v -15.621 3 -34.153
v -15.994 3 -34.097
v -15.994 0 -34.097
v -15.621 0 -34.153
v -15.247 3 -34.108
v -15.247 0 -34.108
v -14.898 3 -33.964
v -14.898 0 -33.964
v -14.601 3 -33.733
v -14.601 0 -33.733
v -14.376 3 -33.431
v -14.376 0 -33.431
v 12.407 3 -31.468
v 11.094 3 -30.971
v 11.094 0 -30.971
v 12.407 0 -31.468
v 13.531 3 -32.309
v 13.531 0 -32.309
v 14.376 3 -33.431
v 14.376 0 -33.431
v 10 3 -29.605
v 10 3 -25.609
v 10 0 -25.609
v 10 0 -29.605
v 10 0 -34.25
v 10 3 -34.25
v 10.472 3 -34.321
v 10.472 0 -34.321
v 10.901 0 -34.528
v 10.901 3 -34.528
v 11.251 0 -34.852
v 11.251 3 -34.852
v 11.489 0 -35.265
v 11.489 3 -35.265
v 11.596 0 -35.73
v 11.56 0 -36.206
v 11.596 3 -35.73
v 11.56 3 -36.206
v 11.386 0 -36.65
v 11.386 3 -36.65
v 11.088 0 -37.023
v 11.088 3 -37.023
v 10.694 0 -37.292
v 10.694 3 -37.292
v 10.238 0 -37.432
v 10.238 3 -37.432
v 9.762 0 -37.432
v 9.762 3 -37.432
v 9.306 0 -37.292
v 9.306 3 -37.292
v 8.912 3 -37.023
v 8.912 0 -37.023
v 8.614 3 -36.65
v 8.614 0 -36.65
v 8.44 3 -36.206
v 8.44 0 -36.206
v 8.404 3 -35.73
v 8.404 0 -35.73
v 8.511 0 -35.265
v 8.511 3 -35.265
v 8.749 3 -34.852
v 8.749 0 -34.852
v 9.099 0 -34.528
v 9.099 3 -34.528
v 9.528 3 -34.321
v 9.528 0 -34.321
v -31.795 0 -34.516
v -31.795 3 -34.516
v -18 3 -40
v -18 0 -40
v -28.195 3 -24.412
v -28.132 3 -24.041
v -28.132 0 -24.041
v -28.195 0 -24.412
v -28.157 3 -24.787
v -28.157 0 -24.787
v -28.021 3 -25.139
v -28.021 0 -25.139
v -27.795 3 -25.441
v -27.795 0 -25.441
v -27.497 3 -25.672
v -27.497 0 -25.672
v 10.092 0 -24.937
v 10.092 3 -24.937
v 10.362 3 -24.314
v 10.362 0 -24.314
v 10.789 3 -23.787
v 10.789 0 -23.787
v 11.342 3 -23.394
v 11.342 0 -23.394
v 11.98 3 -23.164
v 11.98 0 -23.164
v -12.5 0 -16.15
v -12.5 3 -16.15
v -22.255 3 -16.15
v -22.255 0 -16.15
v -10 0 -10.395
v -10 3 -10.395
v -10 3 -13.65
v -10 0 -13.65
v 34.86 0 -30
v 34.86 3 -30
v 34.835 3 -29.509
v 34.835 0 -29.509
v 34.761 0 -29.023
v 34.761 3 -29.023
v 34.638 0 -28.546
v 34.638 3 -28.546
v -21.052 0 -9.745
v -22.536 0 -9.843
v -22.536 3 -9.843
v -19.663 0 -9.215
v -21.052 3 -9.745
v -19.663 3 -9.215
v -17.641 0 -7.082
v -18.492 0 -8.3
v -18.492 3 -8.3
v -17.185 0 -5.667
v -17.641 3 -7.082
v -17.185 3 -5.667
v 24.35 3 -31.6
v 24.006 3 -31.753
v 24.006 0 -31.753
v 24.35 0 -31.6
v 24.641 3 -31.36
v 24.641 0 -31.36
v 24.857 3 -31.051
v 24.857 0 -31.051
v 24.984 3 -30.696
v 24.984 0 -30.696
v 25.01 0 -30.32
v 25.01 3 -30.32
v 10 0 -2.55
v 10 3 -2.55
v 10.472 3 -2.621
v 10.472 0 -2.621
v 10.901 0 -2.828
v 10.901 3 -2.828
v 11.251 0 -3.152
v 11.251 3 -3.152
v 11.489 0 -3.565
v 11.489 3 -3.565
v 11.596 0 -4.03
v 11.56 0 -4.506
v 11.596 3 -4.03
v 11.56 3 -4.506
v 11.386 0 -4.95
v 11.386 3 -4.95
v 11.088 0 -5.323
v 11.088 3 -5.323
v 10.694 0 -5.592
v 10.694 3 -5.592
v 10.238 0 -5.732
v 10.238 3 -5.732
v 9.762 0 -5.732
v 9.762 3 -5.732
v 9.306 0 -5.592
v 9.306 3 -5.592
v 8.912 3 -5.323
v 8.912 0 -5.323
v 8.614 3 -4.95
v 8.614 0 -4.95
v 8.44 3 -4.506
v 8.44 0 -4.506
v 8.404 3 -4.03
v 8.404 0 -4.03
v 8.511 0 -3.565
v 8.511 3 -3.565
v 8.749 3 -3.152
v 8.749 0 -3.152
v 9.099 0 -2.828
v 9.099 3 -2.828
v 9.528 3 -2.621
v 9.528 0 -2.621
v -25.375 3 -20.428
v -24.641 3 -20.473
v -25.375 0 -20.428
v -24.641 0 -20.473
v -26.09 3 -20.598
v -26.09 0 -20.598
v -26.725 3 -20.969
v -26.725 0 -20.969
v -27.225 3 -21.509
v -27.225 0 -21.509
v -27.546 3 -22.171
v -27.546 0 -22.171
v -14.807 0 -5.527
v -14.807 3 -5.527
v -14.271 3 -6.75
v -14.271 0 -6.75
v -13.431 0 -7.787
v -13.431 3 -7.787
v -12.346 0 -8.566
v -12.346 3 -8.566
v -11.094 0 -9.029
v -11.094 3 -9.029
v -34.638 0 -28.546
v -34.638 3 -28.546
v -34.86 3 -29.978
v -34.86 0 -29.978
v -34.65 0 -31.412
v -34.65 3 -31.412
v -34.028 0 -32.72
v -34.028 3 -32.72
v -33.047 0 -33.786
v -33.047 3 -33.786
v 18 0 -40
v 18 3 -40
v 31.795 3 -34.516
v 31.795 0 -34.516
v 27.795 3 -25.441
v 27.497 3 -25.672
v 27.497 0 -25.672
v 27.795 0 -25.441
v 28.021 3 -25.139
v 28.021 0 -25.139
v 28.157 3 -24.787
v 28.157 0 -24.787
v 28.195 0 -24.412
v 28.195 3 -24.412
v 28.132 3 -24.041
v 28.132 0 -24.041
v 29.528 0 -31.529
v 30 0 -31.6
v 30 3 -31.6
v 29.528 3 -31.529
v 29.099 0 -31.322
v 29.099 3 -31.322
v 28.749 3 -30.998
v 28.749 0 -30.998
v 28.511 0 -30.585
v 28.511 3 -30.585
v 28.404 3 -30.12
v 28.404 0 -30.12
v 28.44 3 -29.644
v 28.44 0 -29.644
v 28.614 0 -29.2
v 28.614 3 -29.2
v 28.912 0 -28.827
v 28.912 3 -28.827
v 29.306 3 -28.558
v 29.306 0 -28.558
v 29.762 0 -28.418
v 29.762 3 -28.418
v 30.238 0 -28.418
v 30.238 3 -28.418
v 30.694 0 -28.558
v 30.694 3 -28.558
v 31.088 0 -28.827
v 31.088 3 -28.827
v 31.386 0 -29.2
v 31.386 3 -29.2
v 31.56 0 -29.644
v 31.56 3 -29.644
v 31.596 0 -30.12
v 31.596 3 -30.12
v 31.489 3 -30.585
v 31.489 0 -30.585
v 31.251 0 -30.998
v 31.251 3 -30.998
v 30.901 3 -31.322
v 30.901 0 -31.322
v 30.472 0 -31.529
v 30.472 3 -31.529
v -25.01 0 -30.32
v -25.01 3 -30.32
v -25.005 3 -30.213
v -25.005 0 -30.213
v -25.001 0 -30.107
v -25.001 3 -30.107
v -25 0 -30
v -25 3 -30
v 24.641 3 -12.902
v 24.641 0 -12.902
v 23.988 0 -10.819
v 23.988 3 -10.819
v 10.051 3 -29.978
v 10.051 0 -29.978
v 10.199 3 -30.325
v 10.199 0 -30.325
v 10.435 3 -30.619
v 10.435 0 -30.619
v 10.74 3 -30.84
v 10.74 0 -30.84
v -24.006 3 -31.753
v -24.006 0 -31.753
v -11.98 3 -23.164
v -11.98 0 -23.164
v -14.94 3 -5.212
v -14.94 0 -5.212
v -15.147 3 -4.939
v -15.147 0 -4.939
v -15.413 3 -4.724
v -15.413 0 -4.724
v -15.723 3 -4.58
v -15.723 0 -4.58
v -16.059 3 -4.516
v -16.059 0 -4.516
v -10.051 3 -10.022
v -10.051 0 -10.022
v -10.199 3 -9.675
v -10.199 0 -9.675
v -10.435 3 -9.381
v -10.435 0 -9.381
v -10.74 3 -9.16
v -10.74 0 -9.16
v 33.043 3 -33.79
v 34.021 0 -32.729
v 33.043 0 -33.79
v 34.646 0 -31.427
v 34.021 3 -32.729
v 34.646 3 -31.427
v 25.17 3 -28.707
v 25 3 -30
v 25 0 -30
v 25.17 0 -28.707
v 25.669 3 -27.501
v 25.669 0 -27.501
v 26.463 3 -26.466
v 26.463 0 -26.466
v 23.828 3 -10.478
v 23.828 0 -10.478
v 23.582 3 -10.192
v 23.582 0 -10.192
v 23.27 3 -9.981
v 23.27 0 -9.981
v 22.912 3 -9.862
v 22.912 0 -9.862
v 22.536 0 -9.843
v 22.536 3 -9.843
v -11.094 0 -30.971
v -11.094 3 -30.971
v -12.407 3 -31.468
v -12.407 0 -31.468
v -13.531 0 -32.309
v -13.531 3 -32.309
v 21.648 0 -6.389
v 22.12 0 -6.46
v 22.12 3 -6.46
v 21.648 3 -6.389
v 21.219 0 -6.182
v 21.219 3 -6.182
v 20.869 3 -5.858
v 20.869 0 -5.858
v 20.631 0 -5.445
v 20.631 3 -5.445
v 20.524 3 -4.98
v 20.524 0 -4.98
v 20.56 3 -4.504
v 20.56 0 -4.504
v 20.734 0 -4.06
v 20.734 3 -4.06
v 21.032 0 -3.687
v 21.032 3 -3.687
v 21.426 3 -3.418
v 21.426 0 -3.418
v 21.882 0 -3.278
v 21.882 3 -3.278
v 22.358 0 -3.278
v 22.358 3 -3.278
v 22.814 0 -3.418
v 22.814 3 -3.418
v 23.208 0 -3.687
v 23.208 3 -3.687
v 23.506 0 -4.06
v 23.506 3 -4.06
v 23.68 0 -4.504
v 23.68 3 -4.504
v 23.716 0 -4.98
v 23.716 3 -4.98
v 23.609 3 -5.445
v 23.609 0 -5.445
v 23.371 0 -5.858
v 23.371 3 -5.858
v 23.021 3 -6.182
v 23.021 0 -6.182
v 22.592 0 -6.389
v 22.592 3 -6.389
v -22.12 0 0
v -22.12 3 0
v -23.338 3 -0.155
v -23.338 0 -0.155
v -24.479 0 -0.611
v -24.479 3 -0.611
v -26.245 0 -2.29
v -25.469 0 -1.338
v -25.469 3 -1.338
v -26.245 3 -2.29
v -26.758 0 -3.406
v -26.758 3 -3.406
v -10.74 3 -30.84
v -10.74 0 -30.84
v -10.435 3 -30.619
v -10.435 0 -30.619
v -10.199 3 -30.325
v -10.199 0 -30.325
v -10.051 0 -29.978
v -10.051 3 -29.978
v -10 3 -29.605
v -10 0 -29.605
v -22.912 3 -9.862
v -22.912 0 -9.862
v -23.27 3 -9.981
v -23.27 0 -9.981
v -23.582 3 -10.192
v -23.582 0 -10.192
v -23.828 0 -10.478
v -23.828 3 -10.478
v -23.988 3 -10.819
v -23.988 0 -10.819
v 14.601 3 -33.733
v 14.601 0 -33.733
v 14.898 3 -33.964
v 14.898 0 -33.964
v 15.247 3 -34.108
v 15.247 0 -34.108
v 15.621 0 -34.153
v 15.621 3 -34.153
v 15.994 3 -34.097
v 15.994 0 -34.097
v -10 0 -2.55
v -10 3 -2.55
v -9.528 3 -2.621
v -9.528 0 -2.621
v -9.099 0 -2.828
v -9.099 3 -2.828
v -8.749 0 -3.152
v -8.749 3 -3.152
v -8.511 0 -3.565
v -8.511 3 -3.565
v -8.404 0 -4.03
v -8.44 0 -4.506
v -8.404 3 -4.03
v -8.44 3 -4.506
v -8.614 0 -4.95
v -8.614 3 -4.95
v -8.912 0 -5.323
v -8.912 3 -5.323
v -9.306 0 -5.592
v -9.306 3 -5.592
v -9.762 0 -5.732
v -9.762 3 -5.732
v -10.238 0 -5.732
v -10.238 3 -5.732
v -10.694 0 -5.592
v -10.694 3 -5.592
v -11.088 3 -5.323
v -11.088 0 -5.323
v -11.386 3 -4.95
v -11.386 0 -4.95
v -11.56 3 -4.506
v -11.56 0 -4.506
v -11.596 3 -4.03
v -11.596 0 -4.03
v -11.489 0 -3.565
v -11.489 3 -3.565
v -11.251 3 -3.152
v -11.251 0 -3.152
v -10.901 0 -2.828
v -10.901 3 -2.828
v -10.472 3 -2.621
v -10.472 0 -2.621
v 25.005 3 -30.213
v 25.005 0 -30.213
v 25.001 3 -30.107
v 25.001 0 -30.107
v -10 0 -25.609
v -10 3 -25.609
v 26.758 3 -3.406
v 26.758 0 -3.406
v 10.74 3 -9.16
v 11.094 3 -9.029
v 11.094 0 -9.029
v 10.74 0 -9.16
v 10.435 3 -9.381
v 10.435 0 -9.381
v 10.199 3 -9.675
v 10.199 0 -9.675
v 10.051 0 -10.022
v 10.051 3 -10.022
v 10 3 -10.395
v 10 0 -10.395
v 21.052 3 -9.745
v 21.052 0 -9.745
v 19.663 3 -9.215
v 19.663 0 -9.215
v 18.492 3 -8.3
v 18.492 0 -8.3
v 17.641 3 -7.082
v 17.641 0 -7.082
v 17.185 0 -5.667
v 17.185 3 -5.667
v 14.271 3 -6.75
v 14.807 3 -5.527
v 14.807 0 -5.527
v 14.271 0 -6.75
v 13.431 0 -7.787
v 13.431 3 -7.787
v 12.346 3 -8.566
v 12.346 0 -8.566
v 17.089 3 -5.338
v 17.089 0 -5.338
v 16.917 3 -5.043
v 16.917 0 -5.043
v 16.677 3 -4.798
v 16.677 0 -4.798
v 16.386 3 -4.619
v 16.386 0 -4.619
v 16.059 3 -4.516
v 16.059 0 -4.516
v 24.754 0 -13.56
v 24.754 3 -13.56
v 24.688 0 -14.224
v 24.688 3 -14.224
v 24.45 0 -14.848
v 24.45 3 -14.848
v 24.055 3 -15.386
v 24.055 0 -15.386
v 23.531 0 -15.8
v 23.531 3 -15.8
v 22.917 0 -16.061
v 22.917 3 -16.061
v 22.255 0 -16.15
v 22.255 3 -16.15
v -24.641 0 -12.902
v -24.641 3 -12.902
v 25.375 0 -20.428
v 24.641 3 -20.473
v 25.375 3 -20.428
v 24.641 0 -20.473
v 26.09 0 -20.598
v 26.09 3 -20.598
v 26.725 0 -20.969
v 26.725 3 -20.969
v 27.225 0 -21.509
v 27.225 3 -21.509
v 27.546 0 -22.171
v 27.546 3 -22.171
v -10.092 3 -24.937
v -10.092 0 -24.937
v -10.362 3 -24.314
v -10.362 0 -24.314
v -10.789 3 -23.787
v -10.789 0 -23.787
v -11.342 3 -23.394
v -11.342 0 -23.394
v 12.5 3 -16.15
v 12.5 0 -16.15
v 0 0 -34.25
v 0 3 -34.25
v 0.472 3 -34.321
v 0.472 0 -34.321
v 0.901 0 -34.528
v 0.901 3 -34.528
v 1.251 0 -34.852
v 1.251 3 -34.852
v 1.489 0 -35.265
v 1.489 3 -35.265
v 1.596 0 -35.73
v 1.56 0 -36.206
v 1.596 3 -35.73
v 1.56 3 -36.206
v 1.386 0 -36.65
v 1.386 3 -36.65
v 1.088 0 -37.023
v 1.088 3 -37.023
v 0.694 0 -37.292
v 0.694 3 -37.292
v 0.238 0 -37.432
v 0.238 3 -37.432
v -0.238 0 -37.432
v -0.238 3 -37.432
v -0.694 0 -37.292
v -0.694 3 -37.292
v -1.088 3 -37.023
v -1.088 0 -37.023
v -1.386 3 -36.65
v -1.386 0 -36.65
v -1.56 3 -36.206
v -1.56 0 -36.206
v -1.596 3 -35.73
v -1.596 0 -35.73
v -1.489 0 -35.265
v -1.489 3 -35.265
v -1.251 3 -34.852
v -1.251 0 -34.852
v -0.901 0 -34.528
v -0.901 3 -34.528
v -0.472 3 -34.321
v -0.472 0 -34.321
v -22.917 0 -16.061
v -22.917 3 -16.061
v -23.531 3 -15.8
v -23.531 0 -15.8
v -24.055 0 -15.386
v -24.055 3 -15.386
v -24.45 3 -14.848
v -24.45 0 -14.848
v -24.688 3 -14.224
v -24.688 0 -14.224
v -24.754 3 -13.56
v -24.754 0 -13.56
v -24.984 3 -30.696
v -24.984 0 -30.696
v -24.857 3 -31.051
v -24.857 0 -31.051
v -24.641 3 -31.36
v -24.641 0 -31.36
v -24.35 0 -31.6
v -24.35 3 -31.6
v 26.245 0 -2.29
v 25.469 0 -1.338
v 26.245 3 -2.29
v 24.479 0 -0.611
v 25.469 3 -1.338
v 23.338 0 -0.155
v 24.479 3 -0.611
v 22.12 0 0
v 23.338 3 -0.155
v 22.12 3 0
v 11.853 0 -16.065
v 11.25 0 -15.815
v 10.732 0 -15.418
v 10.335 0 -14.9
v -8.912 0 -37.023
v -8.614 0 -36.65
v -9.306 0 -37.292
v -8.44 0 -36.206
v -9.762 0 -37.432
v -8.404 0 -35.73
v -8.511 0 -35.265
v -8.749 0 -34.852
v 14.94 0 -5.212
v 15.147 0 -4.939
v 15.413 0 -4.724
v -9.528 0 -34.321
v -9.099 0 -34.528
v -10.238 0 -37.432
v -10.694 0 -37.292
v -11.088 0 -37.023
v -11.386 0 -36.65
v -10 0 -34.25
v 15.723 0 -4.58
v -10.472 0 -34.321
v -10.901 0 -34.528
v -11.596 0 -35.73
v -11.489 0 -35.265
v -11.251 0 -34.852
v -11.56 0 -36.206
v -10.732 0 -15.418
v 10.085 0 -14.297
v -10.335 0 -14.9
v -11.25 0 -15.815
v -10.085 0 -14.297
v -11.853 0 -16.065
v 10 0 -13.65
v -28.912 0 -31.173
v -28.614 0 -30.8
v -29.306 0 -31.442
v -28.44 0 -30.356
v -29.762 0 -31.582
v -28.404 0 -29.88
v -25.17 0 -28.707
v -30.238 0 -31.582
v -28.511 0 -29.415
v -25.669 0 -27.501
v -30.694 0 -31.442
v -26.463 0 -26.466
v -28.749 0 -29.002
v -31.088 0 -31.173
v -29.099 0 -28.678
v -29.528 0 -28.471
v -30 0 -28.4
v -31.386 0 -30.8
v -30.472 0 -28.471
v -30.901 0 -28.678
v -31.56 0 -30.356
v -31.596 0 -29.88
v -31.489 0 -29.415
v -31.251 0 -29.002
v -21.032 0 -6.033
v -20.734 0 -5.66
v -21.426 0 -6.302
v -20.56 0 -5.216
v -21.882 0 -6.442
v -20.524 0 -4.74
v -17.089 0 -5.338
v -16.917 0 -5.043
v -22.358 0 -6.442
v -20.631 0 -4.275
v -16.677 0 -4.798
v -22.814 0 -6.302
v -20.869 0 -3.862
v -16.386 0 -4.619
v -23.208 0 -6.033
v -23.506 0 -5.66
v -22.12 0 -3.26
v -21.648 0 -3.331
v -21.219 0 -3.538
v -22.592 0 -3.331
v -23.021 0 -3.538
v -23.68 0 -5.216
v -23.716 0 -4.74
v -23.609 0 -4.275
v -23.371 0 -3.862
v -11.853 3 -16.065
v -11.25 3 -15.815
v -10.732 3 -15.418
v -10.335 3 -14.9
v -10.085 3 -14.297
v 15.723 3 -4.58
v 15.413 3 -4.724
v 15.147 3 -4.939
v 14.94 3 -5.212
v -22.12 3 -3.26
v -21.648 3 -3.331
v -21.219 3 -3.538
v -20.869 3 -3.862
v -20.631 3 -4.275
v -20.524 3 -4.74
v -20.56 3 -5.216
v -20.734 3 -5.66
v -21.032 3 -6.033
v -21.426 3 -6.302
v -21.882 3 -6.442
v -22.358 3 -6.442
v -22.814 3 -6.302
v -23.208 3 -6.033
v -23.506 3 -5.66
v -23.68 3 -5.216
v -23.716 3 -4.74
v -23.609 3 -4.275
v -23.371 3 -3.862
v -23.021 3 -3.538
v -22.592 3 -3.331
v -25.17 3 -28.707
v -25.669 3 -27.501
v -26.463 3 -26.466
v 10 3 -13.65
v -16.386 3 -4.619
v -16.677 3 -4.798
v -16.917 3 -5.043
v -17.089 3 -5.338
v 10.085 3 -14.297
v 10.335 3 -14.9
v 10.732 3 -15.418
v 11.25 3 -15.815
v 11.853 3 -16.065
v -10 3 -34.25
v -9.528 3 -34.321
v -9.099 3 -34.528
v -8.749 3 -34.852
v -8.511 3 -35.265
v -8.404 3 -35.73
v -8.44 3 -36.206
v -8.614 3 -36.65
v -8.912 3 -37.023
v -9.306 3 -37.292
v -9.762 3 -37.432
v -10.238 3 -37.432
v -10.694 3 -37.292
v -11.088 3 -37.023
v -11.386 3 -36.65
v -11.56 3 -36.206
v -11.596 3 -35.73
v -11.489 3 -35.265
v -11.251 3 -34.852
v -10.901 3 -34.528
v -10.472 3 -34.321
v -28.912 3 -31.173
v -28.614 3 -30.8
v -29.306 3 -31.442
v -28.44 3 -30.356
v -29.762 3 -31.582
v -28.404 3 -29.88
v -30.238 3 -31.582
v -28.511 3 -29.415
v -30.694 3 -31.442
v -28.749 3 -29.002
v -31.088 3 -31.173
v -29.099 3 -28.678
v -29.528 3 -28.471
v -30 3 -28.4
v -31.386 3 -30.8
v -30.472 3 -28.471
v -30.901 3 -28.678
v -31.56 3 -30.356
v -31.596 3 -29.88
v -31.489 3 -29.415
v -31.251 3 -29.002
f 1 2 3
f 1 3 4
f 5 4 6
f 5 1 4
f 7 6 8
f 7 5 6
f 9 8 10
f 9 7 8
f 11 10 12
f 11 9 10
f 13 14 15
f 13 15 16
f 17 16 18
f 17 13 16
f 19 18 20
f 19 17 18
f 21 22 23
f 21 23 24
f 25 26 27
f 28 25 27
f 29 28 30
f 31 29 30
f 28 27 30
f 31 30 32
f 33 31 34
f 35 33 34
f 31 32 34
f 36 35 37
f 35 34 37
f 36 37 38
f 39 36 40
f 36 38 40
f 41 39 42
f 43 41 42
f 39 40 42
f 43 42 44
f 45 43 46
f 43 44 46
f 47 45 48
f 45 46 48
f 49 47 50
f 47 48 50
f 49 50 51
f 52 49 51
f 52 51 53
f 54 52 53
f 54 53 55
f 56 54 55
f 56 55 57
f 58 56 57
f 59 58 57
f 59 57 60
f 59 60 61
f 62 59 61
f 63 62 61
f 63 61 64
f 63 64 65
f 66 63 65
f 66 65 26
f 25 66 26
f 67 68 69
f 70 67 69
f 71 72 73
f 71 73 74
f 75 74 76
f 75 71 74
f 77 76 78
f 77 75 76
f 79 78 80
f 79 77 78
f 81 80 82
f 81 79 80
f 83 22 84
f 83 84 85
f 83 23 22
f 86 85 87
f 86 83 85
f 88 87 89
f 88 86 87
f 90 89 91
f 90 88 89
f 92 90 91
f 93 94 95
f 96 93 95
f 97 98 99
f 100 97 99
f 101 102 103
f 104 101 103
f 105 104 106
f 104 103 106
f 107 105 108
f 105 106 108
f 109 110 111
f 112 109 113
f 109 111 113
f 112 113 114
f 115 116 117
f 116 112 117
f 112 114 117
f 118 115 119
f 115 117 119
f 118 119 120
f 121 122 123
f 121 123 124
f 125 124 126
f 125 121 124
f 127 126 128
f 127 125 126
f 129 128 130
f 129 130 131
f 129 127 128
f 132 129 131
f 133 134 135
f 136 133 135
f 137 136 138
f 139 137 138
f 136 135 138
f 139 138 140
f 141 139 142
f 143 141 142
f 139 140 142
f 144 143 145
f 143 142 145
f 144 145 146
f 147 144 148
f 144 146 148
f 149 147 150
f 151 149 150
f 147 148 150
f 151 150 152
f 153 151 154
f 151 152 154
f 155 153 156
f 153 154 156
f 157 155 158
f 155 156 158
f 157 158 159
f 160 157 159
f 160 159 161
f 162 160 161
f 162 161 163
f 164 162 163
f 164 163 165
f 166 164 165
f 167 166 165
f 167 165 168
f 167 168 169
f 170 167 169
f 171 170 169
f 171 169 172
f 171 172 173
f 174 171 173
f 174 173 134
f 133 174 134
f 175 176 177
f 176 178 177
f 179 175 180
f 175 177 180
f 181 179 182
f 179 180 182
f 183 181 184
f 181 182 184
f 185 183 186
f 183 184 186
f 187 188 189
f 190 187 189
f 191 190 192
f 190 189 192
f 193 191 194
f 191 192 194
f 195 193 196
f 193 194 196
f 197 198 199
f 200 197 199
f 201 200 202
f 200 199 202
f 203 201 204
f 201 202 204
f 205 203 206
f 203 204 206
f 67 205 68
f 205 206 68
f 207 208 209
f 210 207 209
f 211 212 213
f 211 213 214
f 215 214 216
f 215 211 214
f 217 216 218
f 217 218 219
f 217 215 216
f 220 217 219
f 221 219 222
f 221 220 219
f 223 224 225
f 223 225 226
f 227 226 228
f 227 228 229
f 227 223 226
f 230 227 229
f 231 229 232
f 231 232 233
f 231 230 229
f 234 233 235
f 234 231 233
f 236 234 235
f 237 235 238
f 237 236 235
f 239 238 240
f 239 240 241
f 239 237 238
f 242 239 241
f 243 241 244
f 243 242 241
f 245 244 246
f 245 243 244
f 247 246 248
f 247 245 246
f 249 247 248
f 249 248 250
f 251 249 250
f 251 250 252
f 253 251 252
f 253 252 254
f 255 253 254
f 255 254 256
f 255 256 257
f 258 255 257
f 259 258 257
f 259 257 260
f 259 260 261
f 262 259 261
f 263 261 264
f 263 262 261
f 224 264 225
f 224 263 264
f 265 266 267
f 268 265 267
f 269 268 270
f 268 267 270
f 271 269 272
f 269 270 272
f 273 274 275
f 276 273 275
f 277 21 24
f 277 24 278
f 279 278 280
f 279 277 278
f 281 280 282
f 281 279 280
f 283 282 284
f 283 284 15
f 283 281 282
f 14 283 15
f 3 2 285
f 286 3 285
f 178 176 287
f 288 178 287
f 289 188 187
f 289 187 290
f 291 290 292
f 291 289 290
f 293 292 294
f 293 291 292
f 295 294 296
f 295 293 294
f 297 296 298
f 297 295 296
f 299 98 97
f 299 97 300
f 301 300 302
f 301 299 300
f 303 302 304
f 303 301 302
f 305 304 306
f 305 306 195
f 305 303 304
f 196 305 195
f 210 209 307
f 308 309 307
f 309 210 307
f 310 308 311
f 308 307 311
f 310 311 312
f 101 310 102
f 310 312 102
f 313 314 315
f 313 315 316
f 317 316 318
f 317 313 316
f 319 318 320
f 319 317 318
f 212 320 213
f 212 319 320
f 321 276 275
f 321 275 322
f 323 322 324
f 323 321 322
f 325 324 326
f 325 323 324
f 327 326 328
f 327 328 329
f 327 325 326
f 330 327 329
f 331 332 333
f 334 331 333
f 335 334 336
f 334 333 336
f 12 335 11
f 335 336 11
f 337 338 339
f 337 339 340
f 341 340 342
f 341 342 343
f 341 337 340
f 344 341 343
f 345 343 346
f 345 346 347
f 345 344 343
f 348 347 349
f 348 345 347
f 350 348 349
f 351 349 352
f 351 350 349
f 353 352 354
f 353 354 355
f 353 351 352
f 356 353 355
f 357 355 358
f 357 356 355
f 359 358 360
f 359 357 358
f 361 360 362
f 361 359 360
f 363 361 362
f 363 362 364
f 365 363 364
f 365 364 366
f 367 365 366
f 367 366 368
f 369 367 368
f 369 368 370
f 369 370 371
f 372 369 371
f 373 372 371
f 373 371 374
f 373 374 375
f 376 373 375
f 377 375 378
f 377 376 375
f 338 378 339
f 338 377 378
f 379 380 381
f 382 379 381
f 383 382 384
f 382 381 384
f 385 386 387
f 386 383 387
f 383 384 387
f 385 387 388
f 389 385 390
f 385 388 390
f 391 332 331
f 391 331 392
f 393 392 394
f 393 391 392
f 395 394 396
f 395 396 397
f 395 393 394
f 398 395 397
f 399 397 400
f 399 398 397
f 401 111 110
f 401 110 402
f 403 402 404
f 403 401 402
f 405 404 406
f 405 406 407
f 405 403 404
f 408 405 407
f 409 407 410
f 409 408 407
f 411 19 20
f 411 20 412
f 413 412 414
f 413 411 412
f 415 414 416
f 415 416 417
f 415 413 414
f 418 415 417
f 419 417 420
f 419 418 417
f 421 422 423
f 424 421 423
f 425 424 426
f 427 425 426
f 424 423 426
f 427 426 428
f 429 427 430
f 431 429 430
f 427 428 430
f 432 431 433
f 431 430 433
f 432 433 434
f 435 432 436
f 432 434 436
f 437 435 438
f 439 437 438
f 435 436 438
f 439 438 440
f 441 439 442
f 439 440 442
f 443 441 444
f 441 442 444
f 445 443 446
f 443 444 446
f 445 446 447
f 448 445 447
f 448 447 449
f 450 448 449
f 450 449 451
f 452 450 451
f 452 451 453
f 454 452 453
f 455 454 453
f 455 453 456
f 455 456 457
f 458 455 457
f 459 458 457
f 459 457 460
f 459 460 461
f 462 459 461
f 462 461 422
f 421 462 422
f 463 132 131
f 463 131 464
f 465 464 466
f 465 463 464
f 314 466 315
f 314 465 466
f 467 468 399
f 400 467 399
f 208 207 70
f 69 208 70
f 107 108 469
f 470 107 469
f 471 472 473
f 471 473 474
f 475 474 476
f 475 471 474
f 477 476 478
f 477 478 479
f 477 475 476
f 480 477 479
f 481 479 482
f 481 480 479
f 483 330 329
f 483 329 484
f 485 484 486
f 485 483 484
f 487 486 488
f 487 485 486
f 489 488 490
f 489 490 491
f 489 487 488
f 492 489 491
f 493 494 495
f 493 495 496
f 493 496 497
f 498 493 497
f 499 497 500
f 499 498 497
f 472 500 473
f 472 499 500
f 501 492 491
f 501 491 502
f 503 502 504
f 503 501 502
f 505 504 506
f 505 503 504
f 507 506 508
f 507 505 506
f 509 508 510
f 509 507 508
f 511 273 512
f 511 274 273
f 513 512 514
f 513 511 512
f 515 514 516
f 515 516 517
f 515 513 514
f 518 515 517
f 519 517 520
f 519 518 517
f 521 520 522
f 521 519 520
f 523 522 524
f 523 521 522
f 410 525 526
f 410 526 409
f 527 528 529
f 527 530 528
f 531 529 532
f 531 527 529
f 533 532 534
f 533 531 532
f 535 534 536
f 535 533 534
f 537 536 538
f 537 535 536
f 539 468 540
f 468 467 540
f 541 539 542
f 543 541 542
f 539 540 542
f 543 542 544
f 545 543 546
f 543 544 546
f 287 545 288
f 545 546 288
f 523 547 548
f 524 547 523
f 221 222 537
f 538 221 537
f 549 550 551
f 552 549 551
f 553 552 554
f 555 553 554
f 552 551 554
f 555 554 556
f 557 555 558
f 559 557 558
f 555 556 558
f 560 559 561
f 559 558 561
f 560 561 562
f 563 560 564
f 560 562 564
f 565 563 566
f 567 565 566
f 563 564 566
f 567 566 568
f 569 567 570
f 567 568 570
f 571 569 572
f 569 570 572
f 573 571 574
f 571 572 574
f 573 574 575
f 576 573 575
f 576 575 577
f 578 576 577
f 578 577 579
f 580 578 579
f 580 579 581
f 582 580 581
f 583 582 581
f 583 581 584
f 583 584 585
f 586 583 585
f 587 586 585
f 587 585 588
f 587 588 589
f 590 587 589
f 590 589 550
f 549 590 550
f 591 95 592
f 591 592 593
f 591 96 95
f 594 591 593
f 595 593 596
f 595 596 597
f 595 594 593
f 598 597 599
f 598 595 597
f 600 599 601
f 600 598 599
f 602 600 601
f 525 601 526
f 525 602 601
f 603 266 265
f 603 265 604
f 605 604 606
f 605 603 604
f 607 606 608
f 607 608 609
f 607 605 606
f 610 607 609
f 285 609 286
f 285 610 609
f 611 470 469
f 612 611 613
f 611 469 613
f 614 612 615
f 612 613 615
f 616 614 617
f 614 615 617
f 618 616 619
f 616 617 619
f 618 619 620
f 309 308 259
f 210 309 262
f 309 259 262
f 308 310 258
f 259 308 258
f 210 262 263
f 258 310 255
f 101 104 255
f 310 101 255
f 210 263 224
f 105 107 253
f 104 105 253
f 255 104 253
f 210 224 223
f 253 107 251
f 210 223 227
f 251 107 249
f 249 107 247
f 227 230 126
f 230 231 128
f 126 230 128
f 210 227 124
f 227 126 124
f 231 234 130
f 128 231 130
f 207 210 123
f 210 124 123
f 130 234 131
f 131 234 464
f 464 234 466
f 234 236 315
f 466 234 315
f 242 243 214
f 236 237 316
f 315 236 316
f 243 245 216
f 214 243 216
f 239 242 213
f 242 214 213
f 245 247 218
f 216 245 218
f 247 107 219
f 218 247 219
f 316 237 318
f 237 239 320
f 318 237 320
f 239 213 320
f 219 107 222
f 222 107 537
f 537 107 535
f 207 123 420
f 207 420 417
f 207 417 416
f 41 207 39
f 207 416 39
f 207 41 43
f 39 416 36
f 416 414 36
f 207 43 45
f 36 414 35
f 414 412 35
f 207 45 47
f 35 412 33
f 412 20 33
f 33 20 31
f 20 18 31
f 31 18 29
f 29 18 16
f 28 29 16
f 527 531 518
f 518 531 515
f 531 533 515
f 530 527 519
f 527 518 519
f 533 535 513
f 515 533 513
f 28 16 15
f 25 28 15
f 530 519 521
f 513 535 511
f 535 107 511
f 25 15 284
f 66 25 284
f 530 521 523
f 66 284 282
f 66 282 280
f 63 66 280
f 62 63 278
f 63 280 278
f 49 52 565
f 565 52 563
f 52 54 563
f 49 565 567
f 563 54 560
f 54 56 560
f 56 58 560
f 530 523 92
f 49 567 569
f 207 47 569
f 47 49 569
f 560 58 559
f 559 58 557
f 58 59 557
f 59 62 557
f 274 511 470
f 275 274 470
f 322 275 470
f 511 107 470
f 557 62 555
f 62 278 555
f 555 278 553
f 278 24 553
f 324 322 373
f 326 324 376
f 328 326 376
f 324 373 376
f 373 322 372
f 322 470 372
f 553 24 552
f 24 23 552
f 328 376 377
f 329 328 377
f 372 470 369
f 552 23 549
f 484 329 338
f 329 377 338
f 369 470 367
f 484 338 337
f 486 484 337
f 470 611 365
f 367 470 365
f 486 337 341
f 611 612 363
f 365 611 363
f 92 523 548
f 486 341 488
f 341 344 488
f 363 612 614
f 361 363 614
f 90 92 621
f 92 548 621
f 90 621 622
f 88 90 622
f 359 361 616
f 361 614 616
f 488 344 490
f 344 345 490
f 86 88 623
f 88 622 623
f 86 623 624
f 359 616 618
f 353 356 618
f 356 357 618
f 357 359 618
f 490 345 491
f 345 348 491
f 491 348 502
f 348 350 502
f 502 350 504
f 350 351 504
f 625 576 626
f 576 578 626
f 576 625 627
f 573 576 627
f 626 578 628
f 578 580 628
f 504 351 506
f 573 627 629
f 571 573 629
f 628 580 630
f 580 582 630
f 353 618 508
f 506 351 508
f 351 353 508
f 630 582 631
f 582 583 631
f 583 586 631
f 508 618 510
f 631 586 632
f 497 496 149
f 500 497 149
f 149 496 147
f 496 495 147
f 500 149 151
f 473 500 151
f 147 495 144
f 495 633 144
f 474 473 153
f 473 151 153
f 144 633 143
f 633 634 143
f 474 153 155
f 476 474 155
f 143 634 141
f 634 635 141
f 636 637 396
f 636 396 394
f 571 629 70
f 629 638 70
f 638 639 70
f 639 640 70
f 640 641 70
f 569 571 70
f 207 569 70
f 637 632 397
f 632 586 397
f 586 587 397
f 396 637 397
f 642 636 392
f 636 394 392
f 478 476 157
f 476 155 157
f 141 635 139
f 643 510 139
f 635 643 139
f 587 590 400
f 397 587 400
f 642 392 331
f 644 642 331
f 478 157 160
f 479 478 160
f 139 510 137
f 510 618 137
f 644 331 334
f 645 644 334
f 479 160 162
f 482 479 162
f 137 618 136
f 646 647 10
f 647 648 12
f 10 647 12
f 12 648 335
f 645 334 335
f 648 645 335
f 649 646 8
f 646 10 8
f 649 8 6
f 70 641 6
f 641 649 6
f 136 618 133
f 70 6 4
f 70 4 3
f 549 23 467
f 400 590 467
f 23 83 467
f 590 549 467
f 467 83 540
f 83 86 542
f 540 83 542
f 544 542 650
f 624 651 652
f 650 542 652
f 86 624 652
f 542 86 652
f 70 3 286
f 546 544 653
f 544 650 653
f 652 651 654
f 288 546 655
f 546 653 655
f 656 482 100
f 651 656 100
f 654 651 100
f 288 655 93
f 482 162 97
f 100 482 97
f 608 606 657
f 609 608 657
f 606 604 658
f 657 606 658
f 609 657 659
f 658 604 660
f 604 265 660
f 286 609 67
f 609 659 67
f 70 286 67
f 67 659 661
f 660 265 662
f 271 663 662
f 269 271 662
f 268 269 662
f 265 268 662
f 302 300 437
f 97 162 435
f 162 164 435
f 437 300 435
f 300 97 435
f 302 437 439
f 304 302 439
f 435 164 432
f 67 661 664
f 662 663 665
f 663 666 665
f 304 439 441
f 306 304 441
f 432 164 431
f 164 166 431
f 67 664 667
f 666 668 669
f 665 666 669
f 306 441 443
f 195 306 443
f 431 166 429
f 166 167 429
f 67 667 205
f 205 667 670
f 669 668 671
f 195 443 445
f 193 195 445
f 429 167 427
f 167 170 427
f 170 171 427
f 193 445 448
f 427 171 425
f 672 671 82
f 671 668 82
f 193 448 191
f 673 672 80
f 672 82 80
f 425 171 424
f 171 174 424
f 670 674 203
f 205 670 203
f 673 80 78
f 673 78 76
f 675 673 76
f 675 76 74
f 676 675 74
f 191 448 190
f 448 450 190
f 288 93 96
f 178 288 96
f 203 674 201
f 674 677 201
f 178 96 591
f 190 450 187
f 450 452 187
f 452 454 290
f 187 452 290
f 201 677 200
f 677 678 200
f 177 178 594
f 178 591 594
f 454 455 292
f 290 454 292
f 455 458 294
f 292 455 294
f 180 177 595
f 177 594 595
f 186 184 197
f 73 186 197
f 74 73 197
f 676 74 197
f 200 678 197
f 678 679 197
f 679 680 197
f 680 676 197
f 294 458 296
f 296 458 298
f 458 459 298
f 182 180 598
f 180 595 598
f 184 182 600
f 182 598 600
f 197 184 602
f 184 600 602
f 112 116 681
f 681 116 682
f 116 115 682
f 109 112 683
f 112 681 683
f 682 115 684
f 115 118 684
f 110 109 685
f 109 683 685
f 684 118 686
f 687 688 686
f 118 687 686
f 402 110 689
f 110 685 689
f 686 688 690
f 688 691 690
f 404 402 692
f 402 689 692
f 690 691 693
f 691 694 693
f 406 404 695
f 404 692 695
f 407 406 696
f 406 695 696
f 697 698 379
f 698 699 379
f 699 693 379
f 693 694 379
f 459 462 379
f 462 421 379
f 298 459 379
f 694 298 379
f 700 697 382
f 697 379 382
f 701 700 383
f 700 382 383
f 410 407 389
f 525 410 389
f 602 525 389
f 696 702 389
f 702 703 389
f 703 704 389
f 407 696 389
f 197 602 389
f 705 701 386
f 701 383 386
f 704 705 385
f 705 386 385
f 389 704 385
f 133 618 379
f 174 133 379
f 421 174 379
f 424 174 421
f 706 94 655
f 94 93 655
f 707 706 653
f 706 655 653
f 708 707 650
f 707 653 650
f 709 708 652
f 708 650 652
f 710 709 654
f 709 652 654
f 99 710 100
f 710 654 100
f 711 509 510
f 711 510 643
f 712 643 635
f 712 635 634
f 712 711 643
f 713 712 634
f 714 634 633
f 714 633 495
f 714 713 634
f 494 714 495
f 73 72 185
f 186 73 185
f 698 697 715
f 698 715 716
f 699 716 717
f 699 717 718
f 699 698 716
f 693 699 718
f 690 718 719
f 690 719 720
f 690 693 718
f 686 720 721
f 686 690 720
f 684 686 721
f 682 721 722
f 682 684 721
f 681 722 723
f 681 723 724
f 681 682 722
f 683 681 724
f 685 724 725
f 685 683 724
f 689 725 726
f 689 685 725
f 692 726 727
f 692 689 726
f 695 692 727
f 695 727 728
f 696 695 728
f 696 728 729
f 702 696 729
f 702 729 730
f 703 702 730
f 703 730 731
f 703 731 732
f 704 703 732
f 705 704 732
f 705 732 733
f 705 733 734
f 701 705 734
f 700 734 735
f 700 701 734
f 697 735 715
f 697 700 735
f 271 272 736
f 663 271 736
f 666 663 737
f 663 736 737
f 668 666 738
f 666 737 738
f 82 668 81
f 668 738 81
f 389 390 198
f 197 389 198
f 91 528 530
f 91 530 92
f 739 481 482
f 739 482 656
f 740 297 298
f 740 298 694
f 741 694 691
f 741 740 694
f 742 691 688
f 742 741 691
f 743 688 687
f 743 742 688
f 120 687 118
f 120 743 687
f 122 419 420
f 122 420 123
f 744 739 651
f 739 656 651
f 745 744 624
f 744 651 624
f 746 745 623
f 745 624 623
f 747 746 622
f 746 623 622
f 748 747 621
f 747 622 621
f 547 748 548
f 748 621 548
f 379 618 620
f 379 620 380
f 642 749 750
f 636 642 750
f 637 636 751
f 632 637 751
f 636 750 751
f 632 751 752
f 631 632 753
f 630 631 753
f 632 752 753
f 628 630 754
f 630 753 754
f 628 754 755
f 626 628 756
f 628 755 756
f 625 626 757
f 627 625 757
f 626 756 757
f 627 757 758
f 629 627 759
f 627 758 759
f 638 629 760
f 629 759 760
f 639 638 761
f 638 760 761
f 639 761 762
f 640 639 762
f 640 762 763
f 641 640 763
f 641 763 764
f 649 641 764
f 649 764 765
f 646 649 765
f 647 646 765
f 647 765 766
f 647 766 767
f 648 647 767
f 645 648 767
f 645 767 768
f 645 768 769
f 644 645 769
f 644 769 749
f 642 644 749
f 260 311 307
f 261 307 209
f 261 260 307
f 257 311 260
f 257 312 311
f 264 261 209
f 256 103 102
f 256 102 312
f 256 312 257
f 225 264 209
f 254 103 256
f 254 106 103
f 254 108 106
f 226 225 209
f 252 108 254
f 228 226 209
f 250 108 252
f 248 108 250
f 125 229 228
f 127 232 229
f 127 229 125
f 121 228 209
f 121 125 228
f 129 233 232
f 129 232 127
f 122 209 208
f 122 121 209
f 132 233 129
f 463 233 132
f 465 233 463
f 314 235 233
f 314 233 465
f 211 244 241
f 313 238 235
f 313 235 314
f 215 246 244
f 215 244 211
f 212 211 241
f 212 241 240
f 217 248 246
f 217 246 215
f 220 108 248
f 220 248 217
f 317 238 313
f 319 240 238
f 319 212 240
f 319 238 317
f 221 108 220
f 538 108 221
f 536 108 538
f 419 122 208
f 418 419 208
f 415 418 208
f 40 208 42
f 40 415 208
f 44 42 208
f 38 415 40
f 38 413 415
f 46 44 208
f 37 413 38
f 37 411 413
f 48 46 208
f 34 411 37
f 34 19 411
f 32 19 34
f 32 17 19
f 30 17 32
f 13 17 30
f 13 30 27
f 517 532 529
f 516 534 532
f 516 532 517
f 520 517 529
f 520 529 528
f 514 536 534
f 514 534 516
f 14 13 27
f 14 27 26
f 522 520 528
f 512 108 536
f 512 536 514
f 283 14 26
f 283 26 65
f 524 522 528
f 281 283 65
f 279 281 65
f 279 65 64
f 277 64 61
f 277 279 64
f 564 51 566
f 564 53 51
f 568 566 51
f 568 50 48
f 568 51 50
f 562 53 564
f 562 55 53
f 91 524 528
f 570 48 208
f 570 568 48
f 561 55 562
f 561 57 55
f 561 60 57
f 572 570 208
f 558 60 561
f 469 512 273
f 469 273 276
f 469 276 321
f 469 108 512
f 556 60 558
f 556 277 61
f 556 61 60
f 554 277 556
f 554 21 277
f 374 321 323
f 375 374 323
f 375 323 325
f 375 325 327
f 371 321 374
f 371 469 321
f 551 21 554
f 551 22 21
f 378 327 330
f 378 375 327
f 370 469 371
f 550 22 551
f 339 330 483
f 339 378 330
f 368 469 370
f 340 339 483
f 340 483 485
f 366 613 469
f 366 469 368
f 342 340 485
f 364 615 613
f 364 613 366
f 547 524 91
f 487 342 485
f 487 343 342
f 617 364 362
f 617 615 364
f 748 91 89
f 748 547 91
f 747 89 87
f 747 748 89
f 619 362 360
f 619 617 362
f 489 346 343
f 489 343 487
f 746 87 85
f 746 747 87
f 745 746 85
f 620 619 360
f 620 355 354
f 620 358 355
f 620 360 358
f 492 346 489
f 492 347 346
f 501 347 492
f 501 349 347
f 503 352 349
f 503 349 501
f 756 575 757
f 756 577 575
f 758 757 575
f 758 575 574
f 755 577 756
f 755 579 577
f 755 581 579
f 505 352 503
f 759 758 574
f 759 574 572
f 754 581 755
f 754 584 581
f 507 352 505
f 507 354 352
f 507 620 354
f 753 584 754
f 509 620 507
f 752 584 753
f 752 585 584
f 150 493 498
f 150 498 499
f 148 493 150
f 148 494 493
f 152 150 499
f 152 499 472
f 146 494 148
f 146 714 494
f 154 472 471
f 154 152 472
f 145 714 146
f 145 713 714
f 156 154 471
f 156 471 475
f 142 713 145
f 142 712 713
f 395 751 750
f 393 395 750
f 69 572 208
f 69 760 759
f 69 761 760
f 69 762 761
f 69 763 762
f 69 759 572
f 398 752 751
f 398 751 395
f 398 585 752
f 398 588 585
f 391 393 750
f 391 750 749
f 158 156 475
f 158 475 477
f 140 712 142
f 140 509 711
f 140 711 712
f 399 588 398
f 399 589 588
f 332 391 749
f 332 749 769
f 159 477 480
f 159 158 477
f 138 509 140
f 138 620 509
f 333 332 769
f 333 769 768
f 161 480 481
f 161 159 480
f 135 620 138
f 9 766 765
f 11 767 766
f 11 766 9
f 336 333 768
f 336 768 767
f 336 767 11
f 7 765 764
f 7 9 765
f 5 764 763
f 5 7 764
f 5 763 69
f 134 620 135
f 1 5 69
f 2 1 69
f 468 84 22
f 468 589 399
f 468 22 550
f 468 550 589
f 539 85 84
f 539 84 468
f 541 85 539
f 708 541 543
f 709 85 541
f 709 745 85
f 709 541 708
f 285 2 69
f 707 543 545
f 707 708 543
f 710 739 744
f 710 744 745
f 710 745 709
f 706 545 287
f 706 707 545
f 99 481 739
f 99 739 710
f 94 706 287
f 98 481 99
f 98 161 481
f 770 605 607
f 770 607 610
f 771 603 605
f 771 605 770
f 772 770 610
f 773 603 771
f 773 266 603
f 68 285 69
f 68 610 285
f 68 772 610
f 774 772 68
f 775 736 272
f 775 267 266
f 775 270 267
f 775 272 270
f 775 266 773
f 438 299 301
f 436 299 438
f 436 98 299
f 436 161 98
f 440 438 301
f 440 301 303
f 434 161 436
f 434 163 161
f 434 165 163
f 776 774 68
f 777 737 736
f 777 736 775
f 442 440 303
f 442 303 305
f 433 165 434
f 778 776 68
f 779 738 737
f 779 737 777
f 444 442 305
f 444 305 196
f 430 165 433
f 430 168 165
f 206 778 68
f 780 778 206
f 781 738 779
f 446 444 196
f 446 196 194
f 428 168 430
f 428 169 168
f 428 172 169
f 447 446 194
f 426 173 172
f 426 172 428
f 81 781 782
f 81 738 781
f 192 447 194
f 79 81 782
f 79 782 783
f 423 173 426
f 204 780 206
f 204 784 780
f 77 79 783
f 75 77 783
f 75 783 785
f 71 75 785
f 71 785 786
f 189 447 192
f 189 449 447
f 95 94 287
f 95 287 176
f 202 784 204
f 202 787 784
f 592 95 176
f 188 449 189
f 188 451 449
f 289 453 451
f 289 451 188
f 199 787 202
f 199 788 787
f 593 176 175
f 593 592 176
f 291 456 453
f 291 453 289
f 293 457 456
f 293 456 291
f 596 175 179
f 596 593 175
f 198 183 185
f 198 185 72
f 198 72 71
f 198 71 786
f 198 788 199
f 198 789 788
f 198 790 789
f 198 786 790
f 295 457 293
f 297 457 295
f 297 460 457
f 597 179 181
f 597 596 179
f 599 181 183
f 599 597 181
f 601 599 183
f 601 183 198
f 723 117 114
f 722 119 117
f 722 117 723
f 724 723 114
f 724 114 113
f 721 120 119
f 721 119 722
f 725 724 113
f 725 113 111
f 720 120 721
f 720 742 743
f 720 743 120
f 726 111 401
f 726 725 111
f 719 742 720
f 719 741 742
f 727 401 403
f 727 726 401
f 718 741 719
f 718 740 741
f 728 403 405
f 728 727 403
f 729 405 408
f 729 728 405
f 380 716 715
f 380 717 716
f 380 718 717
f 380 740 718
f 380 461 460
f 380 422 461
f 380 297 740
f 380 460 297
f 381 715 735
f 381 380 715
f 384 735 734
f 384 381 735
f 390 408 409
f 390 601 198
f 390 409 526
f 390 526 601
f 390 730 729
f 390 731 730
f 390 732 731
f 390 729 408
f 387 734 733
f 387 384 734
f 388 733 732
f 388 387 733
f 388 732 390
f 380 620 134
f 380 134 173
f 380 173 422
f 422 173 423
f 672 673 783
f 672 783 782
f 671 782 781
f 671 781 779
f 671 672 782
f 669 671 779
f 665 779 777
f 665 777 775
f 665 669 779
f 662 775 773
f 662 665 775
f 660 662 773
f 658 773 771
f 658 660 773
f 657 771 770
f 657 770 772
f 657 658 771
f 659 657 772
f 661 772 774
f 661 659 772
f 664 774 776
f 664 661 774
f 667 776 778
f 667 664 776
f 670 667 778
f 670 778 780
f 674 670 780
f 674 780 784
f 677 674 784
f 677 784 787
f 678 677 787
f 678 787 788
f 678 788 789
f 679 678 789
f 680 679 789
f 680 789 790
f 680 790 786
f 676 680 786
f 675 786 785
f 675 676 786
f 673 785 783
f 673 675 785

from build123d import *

# Parameters (mm, degrees)
SKETCH_1_R             = 1.6
EXTRUDE_1_DEPTH        = 3
SKETCH_2_R             = 1.6
CUT_EXTRUDE_1_DEPTH    = 59.077534383
CUT_EXTRUDE_2_DEPTH    = 10
CUT_EXTRUDE_3_DEPTH    = 10
FILLET_1_R             = 2.5
FILLET_2_R             = 1.4
FILLET_1_OF_MIRROR_1_R = 2.5
FILLET_2_OF_MIRROR_1_R = 1.4


with BuildPart() as part:
    # 草图1 → 凸台-拉伸1 (new body)
    with BuildSketch(Plane(origin=(0, 0, 0), x_dir=(1, 0, 0), z_dir=(0, 1, 0))):
        Polygon((42, 0), (-42, 0), (-42, 40), (0, 40), (42, 40), align=None)
        with Locations(Location((-22.12, 4.86, 0), (0, 0, 270))):
            Circle(SKETCH_1_R, mode=Mode.SUBTRACT)
        with Locations(Location((-30, 30, 0), (0, 0, 270))):
            Circle(SKETCH_1_R, mode=Mode.SUBTRACT)
        with Locations(Location((30, 30, 0), (0, 0, 90))):
            Circle(SKETCH_1_R, mode=Mode.SUBTRACT)
        with Locations(Location((22.12, 4.86, 0), (0, 0, 90))):
            Circle(SKETCH_1_R, mode=Mode.SUBTRACT)
    extrude(amount=EXTRUDE_1_DEPTH)

    # 草图2 → 切除-拉伸1 (cut, through all)
    with BuildSketch(Plane(origin=(0, 3, 0), x_dir=(1, 0, 0), z_dir=(0, 1, 0))):
        with Locations(Location((-10, 35.85, 0), (0, 0, 270))):
            Circle(SKETCH_2_R)
        with Locations(Location((10, 35.85, 0), (0, 0, 270))):
            Circle(SKETCH_2_R)
        with Locations(Location((-10, 4.15, 0), (0, 0, 270))):
            Circle(SKETCH_2_R)
        with Locations(Location((10, 4.15, 0), (0, 0, 270))):
            Circle(SKETCH_2_R)
        with Locations(Location((0, 35.85, 0), (0, 0, 270))):
            Circle(SKETCH_2_R)
    extrude(amount=-CUT_EXTRUDE_1_DEPTH, mode=Mode.SUBTRACT)

    # 草图3 → 切除-拉伸2 (cut)
    with BuildSketch(Plane(origin=(0, 3, 0), x_dir=(1, 0, 0), z_dir=(0, 1, 0))):
        with BuildLine():
            ThreePointArc((-22.12, 0), (-24.997070445, 0.943105101), (-26.757523684, 3.406392735))
            Line((-26.757523684, 3.406392735), (-34.637523684, 28.546392735))
            ThreePointArc((-34.637523684, 28.546392735), (-34.388052817, 32.089160711), (-31.795255063, 34.516266075))
            Line((-31.795255063, 34.516266075), (-18, 40))
            Line((-18, 40), (-42, 40))
            Line((-42, 40), (-42, 0))
            Line((-42, 0), (-22.12, 0))
        make_face()
        with BuildLine():
            ThreePointArc((26.757523684, 3.406392735), (24.997070445, 0.943105101), (22.12, 0))
            Line((22.12, 0), (42, 0))
            Line((42, 0), (42, 40))
            Line((42, 40), (18, 40))
            Line((18, 40), (31.795255063, 34.516266075))
            ThreePointArc((31.795255063, 34.516266075), (34.021476073, 32.728979699), (34.86, 30))
            ThreePointArc((34.86, 30), (34.804058966, 29.264733077), (34.637523684, 28.546392735))
            Line((34.637523684, 28.546392735), (26.757523684, 3.406392735))
        make_face()
    extrude(amount=-CUT_EXTRUDE_2_DEPTH, mode=Mode.SUBTRACT)

    # 草图4 → 切除-拉伸3 (cut)
    with BuildSketch(Plane(origin=(0, 3, 0), x_dir=(1, 0, 0), z_dir=(0, 1, 0))):
        with BuildLine():
            Line((-14.798923626, 34.446314839), (-25.201076374, 31.403685161))
            ThreePointArc((-25.201076374, 31.403685161), (-25.050524365, 30.709007006), (-25, 30))
            ThreePointArc((-25, 30), (-25.970272737, 27.040050982), (-28.504519275, 25.228885099))
            Line((-28.504519275, 25.228885099), (-26.865552904, 20))
            Line((-26.865552904, 20), (-10, 23.584883936))
            Line((-10, 23.584883936), (-10, 30.85))
            ThreePointArc((-10, 30.85), (-12.998464123, 31.848848553), (-14.798923626, 34.446314839))
        make_face()
        with BuildLine():
            Line((-10, 16.15), (-25.658790772, 16.15))
            Line((-25.658790772, 16.15), (-23.615480725, 9.631114901))
            ThreePointArc((-23.615480725, 9.631114901), (-19.160050982, 8.889727263), (-17.12, 4.86))
            ThreePointArc((-17.12, 4.86), (-17.122139776, 4.713735907), (-17.128557274, 4.567597002))
            Line((-17.128557274, 4.567597002), (-14.991442726, 4.442402998))
            ThreePointArc((-14.991442726, 4.442402998), (-13.430596523, 7.787445188), (-10, 9.15))
            Line((-10, 9.15), (-10, 16.15))
        make_face()
    cut_extrude_3 = extrude(amount=-CUT_EXTRUDE_3_DEPTH, mode=Mode.SUBTRACT)

    # 圆角1
    fillet_1_edges = [part.edges().sort_by_distance(p)[0] for p in [
        (-10, 1.5, -23.584883936),
        (-26.865552904, 1.5, -20),
        (-25.658790772, 1.5, -16.15),
        (-10, 1.5, -16.15),
    ]]
    fillet(fillet_1_edges, radius=FILLET_1_R)

    # 圆角2
    # the kernel refuses this fillet: 1.4 mm, written as the material it adds along each edge
    with BuildSketch(Plane(origin=(-23.615480725, 3, -9.631114901), x_dir=(0.9813413175629745, 0, -0.1922738111230053), z_dir=(0, -1, 0)), Plane(origin=(-14.991442726, 3, -4.442402998), x_dir=(0.1679804165145185, 0, -0.9857903325086977), z_dir=(0, -1, 0))) as fillet_2_piece_1:
        with BuildLine():
            CenterArc((1.254493801, -1.391497509), FILLET_2_R, 96.317812547, 77.364374907)
            Line((-0.137003708, -1.237436867), (0, 0))
            ThreePointArc((0, 0), (0.55021658, -0.030366038), (1.100433159, 0))
        make_face()
    extrude(amount=3)
    with BuildSketch(Plane(origin=(-10, 3, -9.15), x_dir=(0, 0, -1), z_dir=(0, -1, 0)), Plane(origin=(-17.128557274, 3, -4.567597002), x_dir=(0.998288545196741, 0, 0.058480599594858615), z_dir=(0, -1, 0))) as fillet_2_piece_2:
        with BuildLine():
            CenterArc((1.244997998, -1.4), FILLET_2_R, 90, 77.364374907)
            ThreePointArc((-0.121095314, -1.09375), (-0.030366038, -0.55021658), (0, 0))
            Line((0, 0), (1.244997998, 0))
        make_face()
    extrude(amount=3)
    with BuildSketch(Plane(origin=(-10, 3, -30.85), x_dir=(0, 0, 1), z_dir=(0, -1, 0)), Plane(origin=(-25.201076374, 3, -31.403685161), x_dir=(0.9597847252329514, 0, -0.2807370321306184), z_dir=(0, -1, 0))) as fillet_2_piece_3:
        with BuildLine():
            CenterArc((1.244997998, 1.4), FILLET_2_R, 192.635625093, 77.364374907)
            ThreePointArc((-0.121095314, 1.09375), (-0.030366038, 0.55021658), (0, 0))
            Line((0, 0), (1.244997998, 0))
        make_face()
    extrude(amount=3)
    with BuildSketch(Plane(origin=(-14.798923626, 3, -34.446314839), x_dir=(0.3846499515684246, 0, 0.9230625194202224), z_dir=(0, -1, 0)), Plane(origin=(-28.504519275, 3, -25.228885099), x_dir=(0.9155142544303774, 0, -0.4022855328430172), z_dir=(0, -1, 0))) as fillet_2_piece_4:
        with BuildLine():
            CenterArc((1.254493801, 1.391497509), FILLET_2_R, 186.317812547, 77.364374907)
            Line((-0.137003708, 1.237436867), (0, 0))
            ThreePointArc((0, 0), (0.55021658, 0.030366038), (1.100433159, 0))
        make_face()
    extrude(amount=3)

    # 镜向1: 切除-拉伸3 across plane
    add(cut_extrude_3.mirror(Plane(origin=(0, 0, 0), x_dir=(0, 0, 1), z_dir=(1, 0, 0))), mode=Mode.SUBTRACT)

    # 圆角1 of 镜向1
    fillet_1_of_mirror_1_edges = [part.edges().sort_by_distance(p)[0] for p in [
        (10, 1.5, -23.584883936),
        (26.865552904, 1.5, -20),
        (25.658790772, 1.5, -16.15),
        (10, 1.5, -16.15),
    ]]
    fillet(fillet_1_of_mirror_1_edges, radius=FILLET_1_OF_MIRROR_1_R)

    # 圆角2 of 镜向1
    # the kernel refuses this fillet: 1.4 mm, written as the material it adds along each edge
    with BuildSketch(Plane(origin=(23.615480725, 3, -9.631114901), x_dir=(0.2990961449676297, 0, -0.9542229802648344), z_dir=(0, -1, 0)), Plane(origin=(10, 3, -30.85), x_dir=(0, 0, 1), z_dir=(0, -1, 0)), Plane(origin=(25.201076374, 3, -31.403685161), x_dir=(-0.9597847252329514, 0, -0.2807370321306184), z_dir=(0, -1, 0)), Plane(origin=(14.991442726, 3, -4.442402998), x_dir=(0.9982885451967423, 0, -0.05848059959483981), z_dir=(0, -1, 0))) as fillet_2_of_mirror_1_piece_1:
        with BuildLine():
            CenterArc((1.244997998, -1.4), FILLET_2_OF_MIRROR_1_R, 90, 77.364374907)
            ThreePointArc((-0.121095314, -1.09375), (-0.030366038, -0.55021658), (0, 0))
            Line((0, 0), (1.244997998, 0))
        make_face()
    extrude(amount=3)
    with BuildSketch(Plane(origin=(10, 3, -9.15), x_dir=(0.993926792387083, 0, 0.11004331590389448), z_dir=(0, -1, 0)), Plane(origin=(14.798923626, 3, -34.446314839), x_dir=(-0.3846499515684246, 0, 0.9230625194202224), z_dir=(0, -1, 0)), Plane(origin=(28.504519275, 3, -25.228885099), x_dir=(-0.9155142544303774, 0, -0.4022855328430172), z_dir=(0, -1, 0)), Plane(origin=(17.128557274, 3, -4.567597002), x_dir=(0.05172954697013894, 0, -0.9986611306996304), z_dir=(0, -1, 0))) as fillet_2_of_mirror_1_piece_2:
        with BuildLine():
            CenterArc((1.254493801, -1.391497509), FILLET_2_OF_MIRROR_1_R, 96.317812547, 77.364374907)
            Line((-0.137003708, -1.237436867), (0, 0))
            ThreePointArc((0, 0), (0.55021658, -0.030366038), (1.100433159, 0))
        make_face()
    extrude(amount=3)


solid = part.part
